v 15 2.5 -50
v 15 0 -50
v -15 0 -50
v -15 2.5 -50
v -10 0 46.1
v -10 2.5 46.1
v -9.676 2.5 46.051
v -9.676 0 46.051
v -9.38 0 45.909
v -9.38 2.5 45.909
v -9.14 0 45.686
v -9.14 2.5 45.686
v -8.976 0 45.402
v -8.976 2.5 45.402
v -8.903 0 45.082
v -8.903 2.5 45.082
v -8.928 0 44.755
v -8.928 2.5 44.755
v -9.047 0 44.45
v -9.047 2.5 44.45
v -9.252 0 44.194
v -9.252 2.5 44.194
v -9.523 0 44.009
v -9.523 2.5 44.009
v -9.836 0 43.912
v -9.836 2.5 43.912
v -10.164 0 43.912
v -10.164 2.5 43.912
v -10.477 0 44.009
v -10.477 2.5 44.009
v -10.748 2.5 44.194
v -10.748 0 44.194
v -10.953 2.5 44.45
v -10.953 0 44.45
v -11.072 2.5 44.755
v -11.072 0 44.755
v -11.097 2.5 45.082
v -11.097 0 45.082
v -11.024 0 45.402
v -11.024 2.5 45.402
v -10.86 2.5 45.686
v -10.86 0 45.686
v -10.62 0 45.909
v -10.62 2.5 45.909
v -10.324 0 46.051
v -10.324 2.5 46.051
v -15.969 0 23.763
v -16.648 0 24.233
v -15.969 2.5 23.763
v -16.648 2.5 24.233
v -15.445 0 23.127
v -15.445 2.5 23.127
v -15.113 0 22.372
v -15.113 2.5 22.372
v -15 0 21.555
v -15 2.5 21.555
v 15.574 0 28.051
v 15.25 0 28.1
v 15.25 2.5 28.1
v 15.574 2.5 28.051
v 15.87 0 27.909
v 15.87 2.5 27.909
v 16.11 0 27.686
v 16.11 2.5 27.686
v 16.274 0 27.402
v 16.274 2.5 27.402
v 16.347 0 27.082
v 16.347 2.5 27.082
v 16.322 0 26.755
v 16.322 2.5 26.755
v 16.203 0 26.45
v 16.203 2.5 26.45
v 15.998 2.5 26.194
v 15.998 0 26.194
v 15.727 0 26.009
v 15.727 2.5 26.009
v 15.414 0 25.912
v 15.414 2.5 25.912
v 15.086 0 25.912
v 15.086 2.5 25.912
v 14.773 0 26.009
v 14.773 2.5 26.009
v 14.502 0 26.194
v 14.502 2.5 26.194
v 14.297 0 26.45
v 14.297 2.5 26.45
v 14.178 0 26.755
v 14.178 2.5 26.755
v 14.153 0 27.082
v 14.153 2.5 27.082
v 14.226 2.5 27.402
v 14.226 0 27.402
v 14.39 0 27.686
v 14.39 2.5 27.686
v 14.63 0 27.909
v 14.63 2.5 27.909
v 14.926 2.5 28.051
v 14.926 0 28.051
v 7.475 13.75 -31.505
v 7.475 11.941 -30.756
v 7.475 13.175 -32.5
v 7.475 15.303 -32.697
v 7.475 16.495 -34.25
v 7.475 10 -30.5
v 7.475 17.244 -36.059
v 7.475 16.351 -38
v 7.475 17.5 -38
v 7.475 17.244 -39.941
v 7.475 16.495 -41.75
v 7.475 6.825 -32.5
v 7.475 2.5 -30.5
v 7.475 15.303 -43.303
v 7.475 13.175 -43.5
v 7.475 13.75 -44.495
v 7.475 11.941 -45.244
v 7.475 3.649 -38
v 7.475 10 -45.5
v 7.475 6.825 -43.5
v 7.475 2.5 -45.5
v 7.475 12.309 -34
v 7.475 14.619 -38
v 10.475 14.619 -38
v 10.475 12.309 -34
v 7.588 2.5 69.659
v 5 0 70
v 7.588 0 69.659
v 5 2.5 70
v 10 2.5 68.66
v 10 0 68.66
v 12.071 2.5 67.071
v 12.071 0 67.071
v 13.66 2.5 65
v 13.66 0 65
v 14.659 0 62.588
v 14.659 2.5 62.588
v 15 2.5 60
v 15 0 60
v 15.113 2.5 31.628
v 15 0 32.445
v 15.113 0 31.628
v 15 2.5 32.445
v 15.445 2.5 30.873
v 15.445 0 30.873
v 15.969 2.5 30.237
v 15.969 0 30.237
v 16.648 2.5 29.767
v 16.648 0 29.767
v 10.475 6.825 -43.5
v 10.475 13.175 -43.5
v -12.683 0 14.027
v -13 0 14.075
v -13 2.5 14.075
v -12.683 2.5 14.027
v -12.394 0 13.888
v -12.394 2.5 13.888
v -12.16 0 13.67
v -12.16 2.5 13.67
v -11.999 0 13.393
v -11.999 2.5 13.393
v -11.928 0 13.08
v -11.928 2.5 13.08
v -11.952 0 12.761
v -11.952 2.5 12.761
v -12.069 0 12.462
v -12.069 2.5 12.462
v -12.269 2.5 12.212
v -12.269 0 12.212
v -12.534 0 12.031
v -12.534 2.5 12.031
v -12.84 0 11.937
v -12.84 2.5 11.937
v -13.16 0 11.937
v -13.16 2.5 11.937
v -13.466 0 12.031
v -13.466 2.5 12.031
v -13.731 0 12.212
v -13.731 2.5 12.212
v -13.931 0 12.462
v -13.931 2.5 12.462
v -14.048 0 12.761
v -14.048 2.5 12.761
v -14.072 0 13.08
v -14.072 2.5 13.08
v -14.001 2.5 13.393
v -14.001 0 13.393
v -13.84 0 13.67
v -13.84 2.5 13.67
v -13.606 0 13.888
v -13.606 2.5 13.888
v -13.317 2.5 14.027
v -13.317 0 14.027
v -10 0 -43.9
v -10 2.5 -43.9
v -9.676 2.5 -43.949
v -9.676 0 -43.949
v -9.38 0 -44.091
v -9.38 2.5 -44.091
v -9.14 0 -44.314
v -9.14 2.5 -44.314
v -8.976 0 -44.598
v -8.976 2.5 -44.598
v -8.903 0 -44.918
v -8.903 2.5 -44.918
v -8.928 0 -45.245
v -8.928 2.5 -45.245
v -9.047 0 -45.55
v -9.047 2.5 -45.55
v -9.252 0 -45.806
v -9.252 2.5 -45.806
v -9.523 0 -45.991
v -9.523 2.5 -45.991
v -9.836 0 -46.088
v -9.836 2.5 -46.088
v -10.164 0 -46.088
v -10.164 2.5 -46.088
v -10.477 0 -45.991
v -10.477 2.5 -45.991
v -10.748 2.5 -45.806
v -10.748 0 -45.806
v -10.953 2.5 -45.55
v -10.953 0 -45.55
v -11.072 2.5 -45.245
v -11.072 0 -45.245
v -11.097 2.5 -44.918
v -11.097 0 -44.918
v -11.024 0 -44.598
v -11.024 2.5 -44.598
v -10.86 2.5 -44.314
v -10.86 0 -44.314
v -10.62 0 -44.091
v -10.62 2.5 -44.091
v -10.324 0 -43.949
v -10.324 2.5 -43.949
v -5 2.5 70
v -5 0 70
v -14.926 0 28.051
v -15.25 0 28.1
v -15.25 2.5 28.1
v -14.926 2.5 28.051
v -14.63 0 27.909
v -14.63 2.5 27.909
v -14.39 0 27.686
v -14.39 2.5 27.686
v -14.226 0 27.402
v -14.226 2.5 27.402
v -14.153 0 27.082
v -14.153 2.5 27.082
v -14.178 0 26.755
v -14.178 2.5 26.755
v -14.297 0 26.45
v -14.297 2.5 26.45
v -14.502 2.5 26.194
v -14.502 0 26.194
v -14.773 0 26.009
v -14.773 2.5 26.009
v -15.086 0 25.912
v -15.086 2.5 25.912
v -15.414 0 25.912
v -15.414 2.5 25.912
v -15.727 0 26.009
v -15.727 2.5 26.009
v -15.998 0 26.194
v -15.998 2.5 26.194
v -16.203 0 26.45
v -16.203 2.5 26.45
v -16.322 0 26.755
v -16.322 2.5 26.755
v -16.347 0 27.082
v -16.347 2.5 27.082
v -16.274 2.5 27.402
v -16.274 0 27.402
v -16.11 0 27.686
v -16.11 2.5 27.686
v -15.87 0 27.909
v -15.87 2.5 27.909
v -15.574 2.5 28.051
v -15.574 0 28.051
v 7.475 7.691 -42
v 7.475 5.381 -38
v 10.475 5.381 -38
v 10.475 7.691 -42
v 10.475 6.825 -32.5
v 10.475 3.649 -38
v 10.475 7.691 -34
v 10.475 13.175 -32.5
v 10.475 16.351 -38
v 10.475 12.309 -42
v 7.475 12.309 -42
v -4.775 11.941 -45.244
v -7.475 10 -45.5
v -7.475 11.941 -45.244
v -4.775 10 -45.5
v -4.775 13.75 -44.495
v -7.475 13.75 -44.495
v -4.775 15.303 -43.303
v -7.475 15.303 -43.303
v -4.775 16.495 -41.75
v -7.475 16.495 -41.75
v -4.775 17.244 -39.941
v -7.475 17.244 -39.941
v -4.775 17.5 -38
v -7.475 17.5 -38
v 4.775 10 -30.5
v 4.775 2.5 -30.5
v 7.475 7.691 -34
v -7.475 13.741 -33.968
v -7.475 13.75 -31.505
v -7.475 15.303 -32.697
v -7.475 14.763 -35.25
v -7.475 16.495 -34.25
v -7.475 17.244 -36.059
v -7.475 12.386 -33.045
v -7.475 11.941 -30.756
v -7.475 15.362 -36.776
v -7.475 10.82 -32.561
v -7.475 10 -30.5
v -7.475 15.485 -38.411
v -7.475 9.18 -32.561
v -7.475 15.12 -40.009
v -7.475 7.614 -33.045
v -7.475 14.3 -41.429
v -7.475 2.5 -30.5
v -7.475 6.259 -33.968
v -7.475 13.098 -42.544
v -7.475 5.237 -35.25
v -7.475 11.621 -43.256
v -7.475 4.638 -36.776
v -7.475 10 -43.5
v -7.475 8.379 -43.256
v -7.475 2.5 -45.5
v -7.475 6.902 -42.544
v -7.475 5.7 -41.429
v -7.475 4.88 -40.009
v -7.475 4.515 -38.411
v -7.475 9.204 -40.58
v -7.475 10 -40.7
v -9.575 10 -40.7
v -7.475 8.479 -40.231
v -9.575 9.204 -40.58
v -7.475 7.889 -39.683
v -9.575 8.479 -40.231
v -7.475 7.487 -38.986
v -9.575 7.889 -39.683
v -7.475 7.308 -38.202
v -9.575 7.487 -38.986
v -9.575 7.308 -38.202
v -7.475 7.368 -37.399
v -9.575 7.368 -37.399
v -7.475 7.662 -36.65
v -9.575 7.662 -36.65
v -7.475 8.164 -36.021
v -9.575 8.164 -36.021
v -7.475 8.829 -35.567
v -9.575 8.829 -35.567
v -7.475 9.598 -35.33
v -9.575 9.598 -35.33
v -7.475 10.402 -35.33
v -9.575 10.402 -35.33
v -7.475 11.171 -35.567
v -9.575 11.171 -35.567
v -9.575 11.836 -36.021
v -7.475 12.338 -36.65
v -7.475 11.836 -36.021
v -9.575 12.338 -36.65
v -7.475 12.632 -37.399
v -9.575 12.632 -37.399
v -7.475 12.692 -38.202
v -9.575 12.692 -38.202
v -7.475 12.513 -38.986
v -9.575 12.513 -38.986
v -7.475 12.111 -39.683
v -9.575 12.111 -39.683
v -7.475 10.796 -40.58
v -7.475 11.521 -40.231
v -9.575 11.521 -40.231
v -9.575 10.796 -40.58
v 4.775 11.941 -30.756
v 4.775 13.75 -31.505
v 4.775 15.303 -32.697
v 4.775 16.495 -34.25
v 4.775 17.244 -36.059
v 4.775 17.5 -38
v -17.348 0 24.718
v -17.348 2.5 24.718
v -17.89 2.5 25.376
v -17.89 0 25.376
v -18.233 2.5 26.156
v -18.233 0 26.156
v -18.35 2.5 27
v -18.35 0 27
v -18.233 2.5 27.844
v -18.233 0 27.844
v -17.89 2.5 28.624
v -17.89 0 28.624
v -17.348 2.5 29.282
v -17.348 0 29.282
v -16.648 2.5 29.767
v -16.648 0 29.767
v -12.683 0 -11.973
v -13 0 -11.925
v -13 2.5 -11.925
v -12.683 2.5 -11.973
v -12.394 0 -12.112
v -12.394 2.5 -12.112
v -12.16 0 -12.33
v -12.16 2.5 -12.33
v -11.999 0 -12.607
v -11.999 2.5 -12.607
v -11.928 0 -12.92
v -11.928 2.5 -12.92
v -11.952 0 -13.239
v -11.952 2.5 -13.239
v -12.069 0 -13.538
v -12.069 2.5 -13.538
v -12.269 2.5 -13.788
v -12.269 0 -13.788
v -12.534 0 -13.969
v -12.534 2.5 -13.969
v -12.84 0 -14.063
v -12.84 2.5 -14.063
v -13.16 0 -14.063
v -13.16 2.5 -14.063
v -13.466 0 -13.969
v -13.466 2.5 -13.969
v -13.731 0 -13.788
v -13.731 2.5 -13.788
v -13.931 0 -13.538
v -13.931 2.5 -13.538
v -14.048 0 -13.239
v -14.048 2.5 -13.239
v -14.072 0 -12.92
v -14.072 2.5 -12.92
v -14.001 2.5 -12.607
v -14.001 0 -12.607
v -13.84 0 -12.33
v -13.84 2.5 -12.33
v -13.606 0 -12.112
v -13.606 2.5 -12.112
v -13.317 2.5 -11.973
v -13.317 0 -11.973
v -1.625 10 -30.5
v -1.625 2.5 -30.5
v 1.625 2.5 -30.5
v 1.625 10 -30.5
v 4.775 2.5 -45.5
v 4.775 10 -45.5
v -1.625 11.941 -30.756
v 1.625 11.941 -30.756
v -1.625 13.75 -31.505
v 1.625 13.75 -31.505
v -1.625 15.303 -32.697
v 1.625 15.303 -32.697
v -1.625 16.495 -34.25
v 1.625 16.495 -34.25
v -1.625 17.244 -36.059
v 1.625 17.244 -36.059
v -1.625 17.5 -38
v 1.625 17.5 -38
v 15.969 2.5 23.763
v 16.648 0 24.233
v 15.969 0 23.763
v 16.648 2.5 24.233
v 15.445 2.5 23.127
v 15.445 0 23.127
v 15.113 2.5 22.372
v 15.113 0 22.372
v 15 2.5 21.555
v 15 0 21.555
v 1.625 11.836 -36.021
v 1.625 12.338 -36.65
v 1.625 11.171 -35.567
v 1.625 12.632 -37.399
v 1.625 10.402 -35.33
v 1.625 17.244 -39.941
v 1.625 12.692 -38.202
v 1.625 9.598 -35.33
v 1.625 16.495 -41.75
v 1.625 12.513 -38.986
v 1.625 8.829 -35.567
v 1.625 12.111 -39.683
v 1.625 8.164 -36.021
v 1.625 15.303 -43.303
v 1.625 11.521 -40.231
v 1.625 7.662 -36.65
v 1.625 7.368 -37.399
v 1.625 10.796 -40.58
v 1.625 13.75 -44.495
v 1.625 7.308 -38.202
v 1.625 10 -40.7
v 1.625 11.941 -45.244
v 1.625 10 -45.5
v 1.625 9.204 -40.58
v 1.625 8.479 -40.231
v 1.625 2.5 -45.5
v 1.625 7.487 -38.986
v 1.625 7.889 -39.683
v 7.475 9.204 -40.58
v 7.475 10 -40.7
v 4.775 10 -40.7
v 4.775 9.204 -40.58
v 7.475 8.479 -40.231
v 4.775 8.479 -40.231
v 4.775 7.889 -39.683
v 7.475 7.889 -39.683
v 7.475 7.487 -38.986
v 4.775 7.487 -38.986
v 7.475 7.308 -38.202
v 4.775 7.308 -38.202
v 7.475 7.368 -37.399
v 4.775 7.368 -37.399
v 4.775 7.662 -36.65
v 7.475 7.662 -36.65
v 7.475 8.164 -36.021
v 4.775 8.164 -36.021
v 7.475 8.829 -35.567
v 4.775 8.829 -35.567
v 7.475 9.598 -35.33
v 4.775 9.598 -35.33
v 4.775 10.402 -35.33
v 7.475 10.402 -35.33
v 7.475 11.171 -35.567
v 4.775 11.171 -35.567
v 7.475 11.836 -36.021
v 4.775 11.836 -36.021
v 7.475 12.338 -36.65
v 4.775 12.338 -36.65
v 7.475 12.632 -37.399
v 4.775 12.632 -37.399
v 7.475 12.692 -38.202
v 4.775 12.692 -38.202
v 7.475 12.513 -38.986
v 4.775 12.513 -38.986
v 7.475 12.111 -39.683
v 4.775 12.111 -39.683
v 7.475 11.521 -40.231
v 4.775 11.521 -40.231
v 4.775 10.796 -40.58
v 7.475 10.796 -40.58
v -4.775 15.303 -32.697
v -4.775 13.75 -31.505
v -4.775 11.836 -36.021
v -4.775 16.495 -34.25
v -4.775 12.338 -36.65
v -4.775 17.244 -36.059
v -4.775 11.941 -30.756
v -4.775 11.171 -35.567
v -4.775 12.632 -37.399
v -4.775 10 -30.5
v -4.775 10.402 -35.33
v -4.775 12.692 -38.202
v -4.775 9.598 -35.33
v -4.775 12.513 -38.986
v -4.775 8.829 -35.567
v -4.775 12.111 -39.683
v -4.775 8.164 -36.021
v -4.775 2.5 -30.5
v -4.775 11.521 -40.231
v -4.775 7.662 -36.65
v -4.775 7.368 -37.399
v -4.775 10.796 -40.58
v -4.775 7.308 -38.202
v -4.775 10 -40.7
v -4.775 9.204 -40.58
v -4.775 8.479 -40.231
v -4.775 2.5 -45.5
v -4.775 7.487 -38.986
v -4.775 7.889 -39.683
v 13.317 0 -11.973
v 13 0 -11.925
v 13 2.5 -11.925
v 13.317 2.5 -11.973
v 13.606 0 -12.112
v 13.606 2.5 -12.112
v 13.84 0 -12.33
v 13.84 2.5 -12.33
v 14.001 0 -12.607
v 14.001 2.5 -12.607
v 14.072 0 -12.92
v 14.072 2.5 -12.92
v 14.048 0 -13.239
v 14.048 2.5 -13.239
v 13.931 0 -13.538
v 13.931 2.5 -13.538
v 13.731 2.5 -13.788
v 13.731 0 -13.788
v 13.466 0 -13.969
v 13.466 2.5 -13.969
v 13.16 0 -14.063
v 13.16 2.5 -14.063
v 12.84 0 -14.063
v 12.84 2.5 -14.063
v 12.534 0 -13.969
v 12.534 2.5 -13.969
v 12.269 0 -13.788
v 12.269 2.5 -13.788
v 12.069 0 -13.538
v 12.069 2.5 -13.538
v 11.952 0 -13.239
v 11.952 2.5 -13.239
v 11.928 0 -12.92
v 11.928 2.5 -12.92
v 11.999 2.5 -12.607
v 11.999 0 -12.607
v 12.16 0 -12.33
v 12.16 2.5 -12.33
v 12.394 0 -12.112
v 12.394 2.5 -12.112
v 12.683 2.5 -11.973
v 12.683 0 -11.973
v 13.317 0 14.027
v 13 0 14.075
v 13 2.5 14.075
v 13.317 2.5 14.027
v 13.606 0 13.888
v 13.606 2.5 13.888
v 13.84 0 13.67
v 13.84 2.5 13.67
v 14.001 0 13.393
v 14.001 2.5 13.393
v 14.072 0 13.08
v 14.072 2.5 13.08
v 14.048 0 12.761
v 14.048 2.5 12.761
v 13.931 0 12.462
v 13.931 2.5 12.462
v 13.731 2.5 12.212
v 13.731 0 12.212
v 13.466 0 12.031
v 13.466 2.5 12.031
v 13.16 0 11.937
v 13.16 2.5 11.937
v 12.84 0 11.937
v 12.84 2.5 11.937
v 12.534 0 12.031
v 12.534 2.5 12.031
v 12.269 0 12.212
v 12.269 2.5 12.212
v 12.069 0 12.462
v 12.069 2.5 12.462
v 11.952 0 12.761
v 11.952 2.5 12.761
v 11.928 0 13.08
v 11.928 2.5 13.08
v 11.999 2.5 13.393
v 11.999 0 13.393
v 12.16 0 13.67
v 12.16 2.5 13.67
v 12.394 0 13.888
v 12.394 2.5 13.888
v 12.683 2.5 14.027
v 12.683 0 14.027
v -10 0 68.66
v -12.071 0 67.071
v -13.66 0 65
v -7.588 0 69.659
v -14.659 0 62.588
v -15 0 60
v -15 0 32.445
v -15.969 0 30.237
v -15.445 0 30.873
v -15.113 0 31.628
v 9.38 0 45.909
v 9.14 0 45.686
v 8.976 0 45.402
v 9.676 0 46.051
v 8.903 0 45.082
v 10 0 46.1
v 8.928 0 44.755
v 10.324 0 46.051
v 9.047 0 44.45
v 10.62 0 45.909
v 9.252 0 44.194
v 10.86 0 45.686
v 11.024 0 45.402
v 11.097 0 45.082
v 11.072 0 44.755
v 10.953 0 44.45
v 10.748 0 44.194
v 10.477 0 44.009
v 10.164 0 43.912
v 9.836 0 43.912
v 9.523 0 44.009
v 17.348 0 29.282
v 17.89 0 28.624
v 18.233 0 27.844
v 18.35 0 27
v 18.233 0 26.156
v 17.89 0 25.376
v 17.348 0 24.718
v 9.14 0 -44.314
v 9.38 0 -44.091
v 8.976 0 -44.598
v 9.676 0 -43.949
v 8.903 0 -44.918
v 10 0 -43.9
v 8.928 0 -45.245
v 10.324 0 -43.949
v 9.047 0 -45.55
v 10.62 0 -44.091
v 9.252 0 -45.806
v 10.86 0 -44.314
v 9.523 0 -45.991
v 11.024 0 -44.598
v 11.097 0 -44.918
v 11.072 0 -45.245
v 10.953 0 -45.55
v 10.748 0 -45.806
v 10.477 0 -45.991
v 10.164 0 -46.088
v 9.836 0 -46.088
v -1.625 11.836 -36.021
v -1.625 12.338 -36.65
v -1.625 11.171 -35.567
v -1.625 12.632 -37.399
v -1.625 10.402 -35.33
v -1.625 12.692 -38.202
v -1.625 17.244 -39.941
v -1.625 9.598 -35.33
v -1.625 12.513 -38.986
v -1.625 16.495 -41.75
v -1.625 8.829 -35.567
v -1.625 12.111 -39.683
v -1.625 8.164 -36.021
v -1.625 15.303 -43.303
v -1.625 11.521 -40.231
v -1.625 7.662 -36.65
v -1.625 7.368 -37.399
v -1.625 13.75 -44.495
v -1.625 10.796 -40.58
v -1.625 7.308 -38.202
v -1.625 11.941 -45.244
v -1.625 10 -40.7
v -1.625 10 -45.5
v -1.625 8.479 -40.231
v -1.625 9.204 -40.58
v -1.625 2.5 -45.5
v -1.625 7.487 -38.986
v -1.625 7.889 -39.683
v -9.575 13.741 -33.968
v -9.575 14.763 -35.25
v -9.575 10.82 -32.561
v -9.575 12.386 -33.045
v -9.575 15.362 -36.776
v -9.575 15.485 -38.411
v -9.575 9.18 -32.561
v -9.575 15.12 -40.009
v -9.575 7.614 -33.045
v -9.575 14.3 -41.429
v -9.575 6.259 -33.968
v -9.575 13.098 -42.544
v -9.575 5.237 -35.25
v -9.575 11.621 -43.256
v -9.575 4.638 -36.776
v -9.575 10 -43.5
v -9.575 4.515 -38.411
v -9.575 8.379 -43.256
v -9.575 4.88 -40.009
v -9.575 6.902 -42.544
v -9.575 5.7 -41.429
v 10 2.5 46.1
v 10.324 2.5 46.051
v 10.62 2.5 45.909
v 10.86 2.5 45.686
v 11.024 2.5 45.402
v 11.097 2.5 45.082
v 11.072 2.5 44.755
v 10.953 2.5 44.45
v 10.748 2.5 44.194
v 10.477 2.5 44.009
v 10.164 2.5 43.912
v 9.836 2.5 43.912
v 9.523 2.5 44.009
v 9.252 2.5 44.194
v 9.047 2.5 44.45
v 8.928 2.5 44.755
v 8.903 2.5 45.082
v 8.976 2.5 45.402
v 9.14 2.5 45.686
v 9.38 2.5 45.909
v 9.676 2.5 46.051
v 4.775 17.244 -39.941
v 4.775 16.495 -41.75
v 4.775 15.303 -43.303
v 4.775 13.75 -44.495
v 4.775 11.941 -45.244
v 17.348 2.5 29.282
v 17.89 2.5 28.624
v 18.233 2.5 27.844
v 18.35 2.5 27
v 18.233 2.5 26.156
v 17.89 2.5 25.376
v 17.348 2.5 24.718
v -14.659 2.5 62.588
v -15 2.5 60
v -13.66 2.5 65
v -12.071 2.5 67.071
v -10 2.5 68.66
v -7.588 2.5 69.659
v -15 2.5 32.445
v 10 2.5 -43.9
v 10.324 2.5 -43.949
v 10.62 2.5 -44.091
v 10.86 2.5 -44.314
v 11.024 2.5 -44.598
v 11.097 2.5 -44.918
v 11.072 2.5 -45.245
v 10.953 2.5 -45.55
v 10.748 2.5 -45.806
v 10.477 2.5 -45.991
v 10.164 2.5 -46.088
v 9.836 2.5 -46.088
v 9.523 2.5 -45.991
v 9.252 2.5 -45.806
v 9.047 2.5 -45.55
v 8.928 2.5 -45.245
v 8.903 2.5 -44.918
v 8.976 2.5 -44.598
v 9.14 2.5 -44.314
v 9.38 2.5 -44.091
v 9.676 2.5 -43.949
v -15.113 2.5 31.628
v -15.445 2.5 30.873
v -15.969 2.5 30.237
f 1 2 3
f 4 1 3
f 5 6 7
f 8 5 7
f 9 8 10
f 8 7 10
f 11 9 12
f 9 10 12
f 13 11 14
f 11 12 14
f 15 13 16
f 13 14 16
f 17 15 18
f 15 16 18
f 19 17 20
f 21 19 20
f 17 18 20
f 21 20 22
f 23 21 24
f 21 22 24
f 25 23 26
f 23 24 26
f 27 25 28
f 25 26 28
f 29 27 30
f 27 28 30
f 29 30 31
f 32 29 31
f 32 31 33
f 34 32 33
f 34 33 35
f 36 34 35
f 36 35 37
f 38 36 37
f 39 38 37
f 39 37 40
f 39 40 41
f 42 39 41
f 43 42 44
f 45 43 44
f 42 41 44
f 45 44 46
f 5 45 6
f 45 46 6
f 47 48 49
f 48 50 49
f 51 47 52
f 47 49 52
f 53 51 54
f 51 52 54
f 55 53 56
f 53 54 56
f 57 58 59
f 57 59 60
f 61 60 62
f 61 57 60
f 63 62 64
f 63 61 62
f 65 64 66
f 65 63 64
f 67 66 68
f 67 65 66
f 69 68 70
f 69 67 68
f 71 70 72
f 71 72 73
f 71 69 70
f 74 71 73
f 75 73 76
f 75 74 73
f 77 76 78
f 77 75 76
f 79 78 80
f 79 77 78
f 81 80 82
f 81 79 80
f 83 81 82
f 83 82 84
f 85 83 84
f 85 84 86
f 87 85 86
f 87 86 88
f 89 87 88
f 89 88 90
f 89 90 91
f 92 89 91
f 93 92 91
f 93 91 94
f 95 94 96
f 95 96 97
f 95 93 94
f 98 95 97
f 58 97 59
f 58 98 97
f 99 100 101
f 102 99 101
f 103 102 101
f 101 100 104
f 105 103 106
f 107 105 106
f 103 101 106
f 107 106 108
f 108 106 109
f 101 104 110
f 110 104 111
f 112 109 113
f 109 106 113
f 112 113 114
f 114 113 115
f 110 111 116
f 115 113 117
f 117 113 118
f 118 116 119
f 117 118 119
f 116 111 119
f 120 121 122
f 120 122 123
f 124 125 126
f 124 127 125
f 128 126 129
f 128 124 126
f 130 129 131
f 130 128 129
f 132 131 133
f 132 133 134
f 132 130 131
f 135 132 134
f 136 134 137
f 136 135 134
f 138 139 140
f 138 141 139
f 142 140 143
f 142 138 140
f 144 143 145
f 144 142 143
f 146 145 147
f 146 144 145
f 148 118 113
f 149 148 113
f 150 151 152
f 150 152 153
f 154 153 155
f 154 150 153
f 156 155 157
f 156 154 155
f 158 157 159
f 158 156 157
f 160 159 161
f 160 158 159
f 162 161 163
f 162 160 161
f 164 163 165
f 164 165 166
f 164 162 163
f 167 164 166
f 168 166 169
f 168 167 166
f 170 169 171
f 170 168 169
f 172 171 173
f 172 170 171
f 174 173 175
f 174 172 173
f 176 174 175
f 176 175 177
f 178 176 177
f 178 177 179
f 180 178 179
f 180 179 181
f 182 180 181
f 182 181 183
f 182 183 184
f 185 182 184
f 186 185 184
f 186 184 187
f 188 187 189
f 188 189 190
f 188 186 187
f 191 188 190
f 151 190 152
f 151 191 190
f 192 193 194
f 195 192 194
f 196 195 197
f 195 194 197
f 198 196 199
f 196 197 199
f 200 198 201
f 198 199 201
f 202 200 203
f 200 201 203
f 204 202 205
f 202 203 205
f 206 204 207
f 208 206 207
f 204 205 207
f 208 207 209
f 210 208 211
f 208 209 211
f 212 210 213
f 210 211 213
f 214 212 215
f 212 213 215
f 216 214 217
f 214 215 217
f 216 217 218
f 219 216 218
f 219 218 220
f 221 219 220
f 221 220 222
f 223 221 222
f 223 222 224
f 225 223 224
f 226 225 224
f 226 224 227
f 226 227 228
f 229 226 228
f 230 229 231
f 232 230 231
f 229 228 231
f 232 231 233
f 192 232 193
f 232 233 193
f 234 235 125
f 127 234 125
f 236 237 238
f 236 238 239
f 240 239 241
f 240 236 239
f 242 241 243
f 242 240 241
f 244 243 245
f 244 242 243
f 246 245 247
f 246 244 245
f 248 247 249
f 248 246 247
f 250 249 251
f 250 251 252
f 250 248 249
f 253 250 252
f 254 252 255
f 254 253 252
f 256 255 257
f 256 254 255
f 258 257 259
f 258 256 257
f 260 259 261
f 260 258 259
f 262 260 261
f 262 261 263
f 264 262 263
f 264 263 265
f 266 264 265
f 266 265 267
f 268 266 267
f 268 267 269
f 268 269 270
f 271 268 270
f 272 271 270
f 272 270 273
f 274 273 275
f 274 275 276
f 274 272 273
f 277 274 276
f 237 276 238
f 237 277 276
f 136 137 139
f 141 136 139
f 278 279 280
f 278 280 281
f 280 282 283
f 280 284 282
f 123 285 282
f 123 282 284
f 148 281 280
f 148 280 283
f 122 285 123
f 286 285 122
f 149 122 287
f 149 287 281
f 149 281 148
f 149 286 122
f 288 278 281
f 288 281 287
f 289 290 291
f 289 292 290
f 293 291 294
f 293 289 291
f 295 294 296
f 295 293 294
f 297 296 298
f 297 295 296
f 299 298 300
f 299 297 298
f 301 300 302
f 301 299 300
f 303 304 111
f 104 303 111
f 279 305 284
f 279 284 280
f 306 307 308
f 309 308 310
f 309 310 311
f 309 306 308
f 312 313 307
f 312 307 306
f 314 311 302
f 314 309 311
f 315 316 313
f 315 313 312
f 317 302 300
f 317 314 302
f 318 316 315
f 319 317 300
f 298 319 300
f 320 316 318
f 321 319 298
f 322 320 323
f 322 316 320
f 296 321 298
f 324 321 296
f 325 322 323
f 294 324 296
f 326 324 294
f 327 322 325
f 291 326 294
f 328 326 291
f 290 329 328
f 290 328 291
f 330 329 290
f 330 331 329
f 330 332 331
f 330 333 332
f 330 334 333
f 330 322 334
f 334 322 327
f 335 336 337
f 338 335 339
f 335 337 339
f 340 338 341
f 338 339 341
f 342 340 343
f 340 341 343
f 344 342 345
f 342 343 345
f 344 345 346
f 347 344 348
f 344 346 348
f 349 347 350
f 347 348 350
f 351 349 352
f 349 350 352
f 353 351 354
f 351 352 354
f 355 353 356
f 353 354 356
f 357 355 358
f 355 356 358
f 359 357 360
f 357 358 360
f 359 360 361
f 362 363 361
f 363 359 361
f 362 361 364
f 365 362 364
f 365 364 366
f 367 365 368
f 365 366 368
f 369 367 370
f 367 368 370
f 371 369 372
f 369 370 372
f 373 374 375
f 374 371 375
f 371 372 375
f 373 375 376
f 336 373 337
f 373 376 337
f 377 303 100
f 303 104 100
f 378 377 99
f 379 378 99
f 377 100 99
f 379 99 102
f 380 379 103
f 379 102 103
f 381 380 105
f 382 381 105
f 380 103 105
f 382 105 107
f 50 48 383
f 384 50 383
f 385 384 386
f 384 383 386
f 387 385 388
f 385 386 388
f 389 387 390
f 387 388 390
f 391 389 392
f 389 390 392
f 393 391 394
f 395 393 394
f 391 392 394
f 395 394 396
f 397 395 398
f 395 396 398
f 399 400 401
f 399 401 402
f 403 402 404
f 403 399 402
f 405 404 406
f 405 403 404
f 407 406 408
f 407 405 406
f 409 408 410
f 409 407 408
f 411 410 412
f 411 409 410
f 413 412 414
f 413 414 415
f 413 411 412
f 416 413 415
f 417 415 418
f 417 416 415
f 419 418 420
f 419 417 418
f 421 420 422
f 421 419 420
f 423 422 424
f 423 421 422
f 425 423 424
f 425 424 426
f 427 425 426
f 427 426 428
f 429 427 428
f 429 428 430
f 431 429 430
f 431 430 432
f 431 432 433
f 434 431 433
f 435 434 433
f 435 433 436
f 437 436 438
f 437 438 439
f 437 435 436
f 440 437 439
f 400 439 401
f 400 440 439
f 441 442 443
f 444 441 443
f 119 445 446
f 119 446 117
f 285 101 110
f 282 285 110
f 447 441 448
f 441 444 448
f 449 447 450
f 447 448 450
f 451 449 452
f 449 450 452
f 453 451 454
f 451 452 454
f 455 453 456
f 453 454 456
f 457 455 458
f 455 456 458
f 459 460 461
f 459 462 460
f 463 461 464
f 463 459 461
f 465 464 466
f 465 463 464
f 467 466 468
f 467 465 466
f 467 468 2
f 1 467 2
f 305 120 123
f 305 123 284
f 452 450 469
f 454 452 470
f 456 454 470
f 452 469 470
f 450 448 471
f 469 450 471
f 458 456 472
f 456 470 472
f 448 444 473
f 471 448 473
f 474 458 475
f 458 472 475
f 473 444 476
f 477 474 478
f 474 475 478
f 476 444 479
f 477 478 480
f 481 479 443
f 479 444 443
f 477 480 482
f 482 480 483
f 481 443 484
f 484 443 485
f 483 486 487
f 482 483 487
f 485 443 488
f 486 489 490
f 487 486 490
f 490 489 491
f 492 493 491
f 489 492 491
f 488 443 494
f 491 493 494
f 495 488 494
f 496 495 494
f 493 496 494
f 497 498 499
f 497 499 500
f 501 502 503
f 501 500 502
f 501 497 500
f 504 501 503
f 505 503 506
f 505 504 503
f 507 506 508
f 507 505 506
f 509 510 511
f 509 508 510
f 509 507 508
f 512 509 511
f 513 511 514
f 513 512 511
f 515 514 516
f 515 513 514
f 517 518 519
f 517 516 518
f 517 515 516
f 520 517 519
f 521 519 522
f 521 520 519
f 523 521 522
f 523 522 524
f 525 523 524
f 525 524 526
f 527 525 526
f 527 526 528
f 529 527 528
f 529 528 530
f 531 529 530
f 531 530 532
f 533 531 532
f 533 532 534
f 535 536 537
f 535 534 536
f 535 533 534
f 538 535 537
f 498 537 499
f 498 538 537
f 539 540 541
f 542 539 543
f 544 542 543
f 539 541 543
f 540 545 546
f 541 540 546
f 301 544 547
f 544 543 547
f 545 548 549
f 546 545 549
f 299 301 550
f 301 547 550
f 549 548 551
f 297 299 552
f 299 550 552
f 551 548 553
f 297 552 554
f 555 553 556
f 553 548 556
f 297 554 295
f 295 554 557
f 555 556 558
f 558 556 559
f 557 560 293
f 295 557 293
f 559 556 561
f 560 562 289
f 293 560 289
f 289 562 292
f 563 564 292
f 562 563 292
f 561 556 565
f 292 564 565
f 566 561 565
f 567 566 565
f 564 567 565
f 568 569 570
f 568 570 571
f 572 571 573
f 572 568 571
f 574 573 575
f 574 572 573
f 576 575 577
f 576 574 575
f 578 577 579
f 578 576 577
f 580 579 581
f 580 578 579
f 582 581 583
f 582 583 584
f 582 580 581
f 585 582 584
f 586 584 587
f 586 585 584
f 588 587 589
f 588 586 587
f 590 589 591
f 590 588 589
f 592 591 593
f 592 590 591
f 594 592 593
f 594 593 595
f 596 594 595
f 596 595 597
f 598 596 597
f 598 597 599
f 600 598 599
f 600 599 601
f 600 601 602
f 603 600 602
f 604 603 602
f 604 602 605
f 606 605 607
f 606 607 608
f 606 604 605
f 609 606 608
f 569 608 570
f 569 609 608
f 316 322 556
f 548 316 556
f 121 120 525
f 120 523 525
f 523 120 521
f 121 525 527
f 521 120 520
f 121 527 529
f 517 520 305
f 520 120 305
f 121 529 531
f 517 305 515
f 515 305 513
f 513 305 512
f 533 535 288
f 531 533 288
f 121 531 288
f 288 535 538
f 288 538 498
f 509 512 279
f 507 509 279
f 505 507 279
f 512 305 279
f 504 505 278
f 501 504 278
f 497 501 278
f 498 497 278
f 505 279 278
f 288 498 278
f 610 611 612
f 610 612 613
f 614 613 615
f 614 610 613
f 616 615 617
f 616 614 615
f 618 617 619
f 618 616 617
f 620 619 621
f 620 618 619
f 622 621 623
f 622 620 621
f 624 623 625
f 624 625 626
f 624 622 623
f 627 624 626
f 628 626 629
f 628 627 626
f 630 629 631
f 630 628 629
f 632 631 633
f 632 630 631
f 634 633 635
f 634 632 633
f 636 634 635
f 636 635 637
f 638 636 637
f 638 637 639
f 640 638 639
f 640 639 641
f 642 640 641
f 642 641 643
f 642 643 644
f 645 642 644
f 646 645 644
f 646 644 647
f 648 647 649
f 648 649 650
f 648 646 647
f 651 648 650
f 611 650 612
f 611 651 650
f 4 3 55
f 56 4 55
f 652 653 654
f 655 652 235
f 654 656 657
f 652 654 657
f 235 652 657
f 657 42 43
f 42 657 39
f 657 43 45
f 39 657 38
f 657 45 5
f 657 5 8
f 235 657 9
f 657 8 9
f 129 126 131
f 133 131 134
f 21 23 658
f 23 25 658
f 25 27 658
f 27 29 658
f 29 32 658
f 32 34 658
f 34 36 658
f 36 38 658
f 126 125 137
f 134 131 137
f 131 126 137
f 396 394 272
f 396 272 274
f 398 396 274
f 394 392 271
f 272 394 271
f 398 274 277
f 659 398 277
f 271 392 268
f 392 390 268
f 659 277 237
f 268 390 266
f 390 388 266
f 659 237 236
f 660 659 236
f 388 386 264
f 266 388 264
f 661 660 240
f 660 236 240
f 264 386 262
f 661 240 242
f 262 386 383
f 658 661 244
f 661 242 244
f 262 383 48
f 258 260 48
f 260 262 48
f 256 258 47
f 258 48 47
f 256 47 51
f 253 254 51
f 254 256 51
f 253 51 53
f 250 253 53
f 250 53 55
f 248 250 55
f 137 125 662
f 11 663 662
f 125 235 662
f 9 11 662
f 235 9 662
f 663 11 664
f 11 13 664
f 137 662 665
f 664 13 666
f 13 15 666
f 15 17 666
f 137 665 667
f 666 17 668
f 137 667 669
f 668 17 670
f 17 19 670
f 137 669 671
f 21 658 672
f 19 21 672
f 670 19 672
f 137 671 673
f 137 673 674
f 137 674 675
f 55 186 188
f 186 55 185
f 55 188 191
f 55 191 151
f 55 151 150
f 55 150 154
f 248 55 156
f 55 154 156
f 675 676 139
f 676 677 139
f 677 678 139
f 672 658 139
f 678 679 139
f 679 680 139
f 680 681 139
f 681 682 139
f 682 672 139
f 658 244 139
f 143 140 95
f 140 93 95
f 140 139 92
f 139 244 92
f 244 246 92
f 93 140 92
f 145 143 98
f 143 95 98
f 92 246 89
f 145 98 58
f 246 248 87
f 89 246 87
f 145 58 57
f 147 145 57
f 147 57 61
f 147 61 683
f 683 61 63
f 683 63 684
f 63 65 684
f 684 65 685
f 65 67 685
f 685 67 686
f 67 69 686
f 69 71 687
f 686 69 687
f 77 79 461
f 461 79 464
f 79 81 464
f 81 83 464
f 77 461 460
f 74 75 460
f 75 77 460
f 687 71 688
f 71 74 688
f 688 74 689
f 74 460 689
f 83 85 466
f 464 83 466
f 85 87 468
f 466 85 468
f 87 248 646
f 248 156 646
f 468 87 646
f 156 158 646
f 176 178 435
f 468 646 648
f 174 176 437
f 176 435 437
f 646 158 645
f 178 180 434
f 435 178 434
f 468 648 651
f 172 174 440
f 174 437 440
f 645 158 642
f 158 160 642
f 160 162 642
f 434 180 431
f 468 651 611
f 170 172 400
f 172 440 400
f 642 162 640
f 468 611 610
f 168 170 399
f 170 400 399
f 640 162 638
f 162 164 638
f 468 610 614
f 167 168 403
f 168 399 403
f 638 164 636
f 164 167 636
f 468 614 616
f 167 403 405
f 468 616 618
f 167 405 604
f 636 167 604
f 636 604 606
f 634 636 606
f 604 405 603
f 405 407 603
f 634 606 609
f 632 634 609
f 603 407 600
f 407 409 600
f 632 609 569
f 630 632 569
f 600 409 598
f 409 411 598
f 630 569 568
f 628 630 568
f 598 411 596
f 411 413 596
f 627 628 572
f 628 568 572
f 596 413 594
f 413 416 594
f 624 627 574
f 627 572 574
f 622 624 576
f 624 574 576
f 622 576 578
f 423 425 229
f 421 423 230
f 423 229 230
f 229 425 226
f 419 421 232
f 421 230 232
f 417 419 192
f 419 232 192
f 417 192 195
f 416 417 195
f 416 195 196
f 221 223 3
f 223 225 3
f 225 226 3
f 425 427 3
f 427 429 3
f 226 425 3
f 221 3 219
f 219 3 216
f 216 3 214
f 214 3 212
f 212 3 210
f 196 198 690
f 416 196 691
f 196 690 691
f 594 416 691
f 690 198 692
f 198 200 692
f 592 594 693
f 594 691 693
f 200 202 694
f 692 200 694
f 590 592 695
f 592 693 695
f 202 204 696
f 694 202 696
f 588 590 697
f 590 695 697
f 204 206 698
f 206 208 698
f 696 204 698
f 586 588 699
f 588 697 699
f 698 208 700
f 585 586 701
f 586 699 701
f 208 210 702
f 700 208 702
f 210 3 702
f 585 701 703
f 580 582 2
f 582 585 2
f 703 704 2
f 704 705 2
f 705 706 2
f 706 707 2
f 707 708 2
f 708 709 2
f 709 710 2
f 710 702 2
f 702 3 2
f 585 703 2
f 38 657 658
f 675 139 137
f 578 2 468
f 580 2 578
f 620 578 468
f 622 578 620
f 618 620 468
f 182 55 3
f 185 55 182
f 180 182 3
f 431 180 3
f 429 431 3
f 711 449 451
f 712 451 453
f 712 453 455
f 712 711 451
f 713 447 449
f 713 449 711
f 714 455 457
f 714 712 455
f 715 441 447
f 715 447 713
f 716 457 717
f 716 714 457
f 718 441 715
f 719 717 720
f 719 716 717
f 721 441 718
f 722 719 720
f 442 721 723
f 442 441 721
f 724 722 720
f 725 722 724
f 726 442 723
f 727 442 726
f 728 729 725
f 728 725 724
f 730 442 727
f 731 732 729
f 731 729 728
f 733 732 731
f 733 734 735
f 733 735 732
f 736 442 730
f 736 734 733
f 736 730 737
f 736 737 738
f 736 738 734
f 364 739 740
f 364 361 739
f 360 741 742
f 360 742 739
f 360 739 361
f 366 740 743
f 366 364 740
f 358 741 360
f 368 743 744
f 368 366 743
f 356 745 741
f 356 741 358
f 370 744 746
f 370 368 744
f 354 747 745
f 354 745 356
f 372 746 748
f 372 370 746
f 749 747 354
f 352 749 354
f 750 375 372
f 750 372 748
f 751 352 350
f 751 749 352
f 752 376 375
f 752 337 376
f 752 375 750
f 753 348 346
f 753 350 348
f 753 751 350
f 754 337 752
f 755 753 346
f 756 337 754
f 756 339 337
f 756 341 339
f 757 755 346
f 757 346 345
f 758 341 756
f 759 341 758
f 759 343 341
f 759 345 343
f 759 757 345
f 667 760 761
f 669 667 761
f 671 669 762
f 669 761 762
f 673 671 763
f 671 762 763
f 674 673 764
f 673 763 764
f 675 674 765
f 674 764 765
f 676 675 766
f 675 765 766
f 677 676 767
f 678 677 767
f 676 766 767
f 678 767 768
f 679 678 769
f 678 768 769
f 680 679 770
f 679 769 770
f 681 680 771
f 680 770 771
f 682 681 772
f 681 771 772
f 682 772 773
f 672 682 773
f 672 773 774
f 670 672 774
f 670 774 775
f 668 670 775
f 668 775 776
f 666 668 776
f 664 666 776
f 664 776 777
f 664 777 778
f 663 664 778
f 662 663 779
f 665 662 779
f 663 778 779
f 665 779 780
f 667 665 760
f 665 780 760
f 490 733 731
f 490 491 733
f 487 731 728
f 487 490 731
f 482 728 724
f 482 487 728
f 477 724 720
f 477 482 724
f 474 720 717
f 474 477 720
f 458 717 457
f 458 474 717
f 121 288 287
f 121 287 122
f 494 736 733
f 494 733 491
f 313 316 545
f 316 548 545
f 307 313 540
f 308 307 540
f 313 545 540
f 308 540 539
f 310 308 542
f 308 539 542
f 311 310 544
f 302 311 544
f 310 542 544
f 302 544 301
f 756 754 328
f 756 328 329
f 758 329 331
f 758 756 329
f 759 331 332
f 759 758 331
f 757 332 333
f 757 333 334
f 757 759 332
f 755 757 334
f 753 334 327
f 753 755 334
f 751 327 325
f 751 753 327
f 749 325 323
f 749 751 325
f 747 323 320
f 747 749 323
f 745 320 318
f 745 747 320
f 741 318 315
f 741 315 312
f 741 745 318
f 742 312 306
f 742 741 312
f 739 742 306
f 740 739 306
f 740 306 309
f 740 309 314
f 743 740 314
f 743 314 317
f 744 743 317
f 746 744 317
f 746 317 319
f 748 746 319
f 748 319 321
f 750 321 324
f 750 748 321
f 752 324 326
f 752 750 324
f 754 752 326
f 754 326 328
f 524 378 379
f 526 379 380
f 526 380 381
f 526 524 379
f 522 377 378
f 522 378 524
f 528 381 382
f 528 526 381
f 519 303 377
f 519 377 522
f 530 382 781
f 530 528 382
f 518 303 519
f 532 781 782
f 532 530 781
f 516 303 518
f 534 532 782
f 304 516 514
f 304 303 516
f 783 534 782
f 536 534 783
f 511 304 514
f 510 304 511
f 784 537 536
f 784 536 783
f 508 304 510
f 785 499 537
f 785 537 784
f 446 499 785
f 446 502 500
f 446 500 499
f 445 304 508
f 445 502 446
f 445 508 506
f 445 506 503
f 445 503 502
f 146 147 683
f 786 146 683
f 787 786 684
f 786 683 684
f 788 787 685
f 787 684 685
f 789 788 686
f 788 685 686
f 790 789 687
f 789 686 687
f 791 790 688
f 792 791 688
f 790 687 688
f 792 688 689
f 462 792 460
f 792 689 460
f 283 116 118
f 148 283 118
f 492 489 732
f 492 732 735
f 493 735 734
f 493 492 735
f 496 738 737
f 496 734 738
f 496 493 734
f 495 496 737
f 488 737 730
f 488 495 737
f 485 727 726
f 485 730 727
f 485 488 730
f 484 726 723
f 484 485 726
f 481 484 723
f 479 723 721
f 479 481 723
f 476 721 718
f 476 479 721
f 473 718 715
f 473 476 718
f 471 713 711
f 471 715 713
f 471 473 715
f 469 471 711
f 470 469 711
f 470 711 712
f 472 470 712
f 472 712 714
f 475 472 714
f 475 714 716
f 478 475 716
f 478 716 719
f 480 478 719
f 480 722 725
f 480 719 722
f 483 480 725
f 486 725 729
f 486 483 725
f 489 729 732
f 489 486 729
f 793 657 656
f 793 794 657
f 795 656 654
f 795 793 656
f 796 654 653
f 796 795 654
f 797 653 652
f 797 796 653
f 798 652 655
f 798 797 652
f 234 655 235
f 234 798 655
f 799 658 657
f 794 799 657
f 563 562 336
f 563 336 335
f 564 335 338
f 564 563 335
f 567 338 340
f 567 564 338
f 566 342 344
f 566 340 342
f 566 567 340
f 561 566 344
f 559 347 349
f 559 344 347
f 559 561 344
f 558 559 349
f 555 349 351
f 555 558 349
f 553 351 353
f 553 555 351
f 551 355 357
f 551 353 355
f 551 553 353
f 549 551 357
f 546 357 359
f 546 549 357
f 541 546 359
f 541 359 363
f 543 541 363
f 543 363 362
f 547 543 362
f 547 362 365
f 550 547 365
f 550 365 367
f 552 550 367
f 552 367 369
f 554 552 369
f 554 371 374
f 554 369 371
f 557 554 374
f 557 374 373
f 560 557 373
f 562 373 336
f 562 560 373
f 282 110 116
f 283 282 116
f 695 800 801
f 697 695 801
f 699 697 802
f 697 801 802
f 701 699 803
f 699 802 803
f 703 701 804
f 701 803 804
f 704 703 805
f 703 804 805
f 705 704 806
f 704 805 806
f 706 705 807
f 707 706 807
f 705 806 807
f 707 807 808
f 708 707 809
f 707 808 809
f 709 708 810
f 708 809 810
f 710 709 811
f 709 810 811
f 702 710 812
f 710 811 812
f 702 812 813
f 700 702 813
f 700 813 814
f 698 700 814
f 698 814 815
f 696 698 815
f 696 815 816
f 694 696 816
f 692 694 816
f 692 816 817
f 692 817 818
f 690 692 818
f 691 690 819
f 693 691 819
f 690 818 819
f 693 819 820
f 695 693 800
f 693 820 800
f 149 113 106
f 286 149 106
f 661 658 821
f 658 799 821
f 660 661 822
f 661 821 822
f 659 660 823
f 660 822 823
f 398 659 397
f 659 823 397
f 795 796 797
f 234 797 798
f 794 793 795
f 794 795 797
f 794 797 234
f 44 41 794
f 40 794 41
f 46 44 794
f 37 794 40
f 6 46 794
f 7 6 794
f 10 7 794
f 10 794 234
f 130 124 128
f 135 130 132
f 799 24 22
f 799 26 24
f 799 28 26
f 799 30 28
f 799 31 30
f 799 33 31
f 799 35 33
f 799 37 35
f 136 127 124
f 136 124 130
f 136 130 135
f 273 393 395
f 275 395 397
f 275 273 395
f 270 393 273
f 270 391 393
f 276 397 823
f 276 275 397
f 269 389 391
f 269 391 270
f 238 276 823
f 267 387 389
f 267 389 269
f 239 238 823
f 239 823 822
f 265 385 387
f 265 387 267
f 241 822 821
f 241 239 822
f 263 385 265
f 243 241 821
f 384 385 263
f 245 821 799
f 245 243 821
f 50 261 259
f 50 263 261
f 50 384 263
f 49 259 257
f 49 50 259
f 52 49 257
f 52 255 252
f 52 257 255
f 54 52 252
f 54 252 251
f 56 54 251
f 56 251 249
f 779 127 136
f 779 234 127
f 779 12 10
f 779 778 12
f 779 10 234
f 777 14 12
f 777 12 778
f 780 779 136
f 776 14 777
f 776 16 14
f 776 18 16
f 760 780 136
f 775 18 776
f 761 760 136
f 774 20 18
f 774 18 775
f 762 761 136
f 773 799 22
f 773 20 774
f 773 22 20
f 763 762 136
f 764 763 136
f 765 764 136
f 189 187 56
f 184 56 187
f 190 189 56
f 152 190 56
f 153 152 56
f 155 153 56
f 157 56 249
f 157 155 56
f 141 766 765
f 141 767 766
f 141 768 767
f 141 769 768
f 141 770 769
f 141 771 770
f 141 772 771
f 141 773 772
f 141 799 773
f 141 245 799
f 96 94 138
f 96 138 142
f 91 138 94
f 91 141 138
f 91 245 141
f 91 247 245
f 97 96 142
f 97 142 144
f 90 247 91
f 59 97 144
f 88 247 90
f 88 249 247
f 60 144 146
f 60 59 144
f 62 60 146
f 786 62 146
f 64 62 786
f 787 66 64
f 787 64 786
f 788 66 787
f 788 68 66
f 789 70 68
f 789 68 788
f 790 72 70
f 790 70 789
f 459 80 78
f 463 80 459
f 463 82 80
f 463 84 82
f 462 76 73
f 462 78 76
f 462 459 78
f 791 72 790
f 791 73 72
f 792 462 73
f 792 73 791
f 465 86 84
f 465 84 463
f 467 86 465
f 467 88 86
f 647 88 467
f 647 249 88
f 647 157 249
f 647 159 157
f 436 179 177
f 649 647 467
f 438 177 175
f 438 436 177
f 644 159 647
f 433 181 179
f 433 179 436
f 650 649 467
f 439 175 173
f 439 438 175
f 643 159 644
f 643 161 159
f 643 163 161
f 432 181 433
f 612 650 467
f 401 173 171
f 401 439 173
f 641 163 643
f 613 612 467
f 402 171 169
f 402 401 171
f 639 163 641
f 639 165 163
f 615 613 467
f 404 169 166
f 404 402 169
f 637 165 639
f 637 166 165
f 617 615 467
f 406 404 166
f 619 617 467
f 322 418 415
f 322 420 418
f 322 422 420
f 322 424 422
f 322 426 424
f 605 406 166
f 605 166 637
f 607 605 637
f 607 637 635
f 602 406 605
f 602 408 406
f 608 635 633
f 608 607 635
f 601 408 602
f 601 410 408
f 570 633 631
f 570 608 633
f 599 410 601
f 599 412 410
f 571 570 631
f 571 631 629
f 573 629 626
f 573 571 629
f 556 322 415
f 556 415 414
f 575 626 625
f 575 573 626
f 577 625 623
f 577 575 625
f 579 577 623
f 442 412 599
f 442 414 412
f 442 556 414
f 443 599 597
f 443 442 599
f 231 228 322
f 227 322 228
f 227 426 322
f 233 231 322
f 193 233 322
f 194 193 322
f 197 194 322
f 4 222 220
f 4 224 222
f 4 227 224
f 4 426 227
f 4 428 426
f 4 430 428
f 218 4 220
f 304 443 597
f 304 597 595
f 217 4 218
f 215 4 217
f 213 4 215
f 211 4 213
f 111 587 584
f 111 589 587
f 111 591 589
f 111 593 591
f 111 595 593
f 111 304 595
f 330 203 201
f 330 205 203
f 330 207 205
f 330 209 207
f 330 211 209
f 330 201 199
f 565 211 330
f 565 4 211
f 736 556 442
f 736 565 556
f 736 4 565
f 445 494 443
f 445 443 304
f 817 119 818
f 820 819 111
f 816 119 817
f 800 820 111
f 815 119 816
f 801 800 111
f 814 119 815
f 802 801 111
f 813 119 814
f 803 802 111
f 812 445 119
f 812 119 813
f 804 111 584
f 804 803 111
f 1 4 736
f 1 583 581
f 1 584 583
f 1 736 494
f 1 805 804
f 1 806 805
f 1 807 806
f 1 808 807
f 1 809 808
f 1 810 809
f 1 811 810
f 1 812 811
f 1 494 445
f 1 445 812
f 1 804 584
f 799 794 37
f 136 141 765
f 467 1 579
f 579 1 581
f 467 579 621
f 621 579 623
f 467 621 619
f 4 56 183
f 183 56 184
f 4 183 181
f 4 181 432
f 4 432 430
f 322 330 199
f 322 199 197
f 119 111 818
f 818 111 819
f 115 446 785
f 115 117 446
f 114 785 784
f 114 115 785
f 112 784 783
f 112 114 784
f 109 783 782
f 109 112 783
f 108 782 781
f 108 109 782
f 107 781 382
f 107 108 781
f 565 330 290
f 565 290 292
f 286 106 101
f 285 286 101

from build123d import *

# Parameters (mm, degrees)
SKETCH29_R              = 1.1
SKETCH29_R_2            = 1.075
BOSS_EXTRUDE19_DEPTH    = 2.5
SKETCH31_R              = 1.1
CUT_EXTRUDE2_DEPTH      = 2.5
SKETCH15_W              = 3.25
SKETCH15_H              = 15
SKETCH15_W_2            = 2.7
BOSS_EXTRUDE11_DEPTH    = 15
FILLET10_R              = 7.5
CUT_EXTRUDE1_DEPTH      = 12
CUT_EXTRUDE1_DEPTH_BACK = 17
SKETCH16_R              = 2.7
BOSS_EXTRUDE12_START    = 2.1
SKETCH17_R              = 5.5
SKETCH17_R_2            = 2.7
BOSS_EXTRUDE12_DEPTH    = 2.1
BOSS_EXTRUDE17_DEPTH    = 3
FILLET11_R              = 3
FILLET12_R              = 10


with BuildPart() as part:
    # Sketch29 → Boss-Extrude19 (new body)
    with BuildSketch(Plane(origin=(0, 0, 0), x_dir=(1, 0, 0), z_dir=(0, 1, 0))):
        with BuildLine():
            Line((-15, -70), (15, -70))
            Line((15, -70), (15, -30.089902911))
            ThreePointArc((15, -30.089902911), (18.35, -27), (15, -23.910097089))
            Line((15, -23.910097089), (15, 50))
            Line((15, 50), (-15, 50))
            Line((-15, 50), (-15, -23.910097089))
            ThreePointArc((-15, -23.910097089), (-18.35, -27), (-15, -30.089902911))
            Line((-15, -30.089902911), (-15, -70))
        make_face()
        with Locations(Location((-15.25, -27, 0), (0, 0, 270))):
            Circle(SKETCH29_R, mode=Mode.SUBTRACT)
        with Locations(Location((-13, 13, 0), (0, 0, 270))):
            Circle(SKETCH29_R_2, mode=Mode.SUBTRACT)
        with Locations(Location((13, 13, 0), (0, 0, 270))):
            Circle(SKETCH29_R_2, mode=Mode.SUBTRACT)
        with Locations(Location((13, -13, 0), (0, 0, 270))):
            Circle(SKETCH29_R_2, mode=Mode.SUBTRACT)
        with Locations(Location((-13, -13, 0), (0, 0, 270))):
            Circle(SKETCH29_R_2, mode=Mode.SUBTRACT)
        with Locations(Location((15.25, -27, 0), (0, 0, 270))):
            Circle(SKETCH29_R, mode=Mode.SUBTRACT)
    extrude(amount=BOSS_EXTRUDE19_DEPTH)

    # Sketch31 → Cut-Extrude2 (cut)
    with BuildSketch(Plane(origin=(0, 2.5, 0), x_dir=(1, 0, 0), z_dir=(0, 1, 0))):
        with Locations(Location((-10, -45, 0), (0, 0, 270))):
            Circle(SKETCH31_R)
        with Locations(Location((10, -45, 0), (0, 0, 270))):
            Circle(SKETCH31_R)
        with Locations(Location((-10, 45, 0), (0, 0, 270))):
            Circle(SKETCH31_R)
        with Locations(Location((10, 45, 0), (0, 0, 270))):
            Circle(SKETCH31_R)
    extrude(amount=-CUT_EXTRUDE2_DEPTH, mode=Mode.SUBTRACT)

    # Sketch15 → Boss-Extrude11 (add)
    with BuildSketch(Plane(origin=(0, 2.5, 0), x_dir=(1, 0, 0), z_dir=(0, 1, 0))):
        with Locations((0, 38)):
            Rectangle(SKETCH15_W, SKETCH15_H)
        with Locations((-6.125, 38)):
            Rectangle(SKETCH15_W_2, SKETCH15_H)
        with Locations((6.125, 38)):
            Rectangle(SKETCH15_W_2, SKETCH15_H)
    extrude(amount=BOSS_EXTRUDE11_DEPTH)

    # Fillet10
    fillet10_edges = [part.edges().sort_by_distance(p)[0] for p in [
        (6.125, 17.5, -30.5),
        (6.125, 17.5, -45.5),
        (0, 17.5, -30.5),
        (0, 17.5, -45.5),
        (-6.125, 17.5, -30.5),
        (-6.125, 17.5, -45.5),
    ]]
    fillet(fillet10_edges, radius=FILLET10_R - 0.0001)  # a hair under: the kernel refuses the full size

    # Sketch16 → Cut-Extrude1 (cut, two sides: drawn at the far end of the back side and taken through both)
    with BuildSketch(Plane.ZY.offset(7.475).offset(-CUT_EXTRUDE1_DEPTH_BACK)):
        with Locations(Location((-38, 10, 0), (0, 0, 180))):
            Circle(SKETCH16_R)
    extrude(amount=CUT_EXTRUDE1_DEPTH + CUT_EXTRUDE1_DEPTH_BACK, mode=Mode.SUBTRACT)

    # Sketch17 → Boss-Extrude12 (add)
    with BuildSketch(Plane.ZY.offset(7.475).offset(BOSS_EXTRUDE12_START)):
        with Locations(Location((-38, 10, 0), (0, 0, 180))):
            Circle(SKETCH17_R)
        with Locations(Location((-38, 10, 0), (0, 0, 180))):
            Circle(SKETCH17_R_2, mode=Mode.SUBTRACT)
    extrude(amount=-BOSS_EXTRUDE12_DEPTH)

    # Sketch23 → Boss-Extrude17 (add)
    with BuildSketch(Plane(origin=(7.475, 0, 0), x_dir=(0, 0, -1), z_dir=(1, 0, 0))):
        Polygon((38, 16.350852961), (32.5, 13.175426481), (32.5, 6.824573519), (38, 3.649147039), (43.5, 6.824573519), (43.5, 13.175426481), align=None)
        Polygon((38, 14.618802154), (34, 12.309401077), (34, 7.690598923), (38, 5.381197846), (42, 7.690598923), (42, 12.309401077), align=None, mode=Mode.SUBTRACT)
    extrude(amount=BOSS_EXTRUDE17_DEPTH)

    # Fillet11
    fillet11_edges = [part.edges().sort_by_distance(p)[0] for p in [
        (15, 1.25, 23.910097089),
        (15, 1.25, 30.089902911),
        (-15, 1.25, 30.089902911),
        (-15, 1.25, 23.910097089),
    ]]
    fillet(fillet11_edges, radius=FILLET11_R)

    # Fillet12
    fillet12_edges = [part.edges().sort_by_distance(p)[0] for p in [
        (15, 1.25, 70),
        (-15, 1.25, 70),
    ]]
    fillet(fillet12_edges, radius=FILLET12_R)


solid = part.part
